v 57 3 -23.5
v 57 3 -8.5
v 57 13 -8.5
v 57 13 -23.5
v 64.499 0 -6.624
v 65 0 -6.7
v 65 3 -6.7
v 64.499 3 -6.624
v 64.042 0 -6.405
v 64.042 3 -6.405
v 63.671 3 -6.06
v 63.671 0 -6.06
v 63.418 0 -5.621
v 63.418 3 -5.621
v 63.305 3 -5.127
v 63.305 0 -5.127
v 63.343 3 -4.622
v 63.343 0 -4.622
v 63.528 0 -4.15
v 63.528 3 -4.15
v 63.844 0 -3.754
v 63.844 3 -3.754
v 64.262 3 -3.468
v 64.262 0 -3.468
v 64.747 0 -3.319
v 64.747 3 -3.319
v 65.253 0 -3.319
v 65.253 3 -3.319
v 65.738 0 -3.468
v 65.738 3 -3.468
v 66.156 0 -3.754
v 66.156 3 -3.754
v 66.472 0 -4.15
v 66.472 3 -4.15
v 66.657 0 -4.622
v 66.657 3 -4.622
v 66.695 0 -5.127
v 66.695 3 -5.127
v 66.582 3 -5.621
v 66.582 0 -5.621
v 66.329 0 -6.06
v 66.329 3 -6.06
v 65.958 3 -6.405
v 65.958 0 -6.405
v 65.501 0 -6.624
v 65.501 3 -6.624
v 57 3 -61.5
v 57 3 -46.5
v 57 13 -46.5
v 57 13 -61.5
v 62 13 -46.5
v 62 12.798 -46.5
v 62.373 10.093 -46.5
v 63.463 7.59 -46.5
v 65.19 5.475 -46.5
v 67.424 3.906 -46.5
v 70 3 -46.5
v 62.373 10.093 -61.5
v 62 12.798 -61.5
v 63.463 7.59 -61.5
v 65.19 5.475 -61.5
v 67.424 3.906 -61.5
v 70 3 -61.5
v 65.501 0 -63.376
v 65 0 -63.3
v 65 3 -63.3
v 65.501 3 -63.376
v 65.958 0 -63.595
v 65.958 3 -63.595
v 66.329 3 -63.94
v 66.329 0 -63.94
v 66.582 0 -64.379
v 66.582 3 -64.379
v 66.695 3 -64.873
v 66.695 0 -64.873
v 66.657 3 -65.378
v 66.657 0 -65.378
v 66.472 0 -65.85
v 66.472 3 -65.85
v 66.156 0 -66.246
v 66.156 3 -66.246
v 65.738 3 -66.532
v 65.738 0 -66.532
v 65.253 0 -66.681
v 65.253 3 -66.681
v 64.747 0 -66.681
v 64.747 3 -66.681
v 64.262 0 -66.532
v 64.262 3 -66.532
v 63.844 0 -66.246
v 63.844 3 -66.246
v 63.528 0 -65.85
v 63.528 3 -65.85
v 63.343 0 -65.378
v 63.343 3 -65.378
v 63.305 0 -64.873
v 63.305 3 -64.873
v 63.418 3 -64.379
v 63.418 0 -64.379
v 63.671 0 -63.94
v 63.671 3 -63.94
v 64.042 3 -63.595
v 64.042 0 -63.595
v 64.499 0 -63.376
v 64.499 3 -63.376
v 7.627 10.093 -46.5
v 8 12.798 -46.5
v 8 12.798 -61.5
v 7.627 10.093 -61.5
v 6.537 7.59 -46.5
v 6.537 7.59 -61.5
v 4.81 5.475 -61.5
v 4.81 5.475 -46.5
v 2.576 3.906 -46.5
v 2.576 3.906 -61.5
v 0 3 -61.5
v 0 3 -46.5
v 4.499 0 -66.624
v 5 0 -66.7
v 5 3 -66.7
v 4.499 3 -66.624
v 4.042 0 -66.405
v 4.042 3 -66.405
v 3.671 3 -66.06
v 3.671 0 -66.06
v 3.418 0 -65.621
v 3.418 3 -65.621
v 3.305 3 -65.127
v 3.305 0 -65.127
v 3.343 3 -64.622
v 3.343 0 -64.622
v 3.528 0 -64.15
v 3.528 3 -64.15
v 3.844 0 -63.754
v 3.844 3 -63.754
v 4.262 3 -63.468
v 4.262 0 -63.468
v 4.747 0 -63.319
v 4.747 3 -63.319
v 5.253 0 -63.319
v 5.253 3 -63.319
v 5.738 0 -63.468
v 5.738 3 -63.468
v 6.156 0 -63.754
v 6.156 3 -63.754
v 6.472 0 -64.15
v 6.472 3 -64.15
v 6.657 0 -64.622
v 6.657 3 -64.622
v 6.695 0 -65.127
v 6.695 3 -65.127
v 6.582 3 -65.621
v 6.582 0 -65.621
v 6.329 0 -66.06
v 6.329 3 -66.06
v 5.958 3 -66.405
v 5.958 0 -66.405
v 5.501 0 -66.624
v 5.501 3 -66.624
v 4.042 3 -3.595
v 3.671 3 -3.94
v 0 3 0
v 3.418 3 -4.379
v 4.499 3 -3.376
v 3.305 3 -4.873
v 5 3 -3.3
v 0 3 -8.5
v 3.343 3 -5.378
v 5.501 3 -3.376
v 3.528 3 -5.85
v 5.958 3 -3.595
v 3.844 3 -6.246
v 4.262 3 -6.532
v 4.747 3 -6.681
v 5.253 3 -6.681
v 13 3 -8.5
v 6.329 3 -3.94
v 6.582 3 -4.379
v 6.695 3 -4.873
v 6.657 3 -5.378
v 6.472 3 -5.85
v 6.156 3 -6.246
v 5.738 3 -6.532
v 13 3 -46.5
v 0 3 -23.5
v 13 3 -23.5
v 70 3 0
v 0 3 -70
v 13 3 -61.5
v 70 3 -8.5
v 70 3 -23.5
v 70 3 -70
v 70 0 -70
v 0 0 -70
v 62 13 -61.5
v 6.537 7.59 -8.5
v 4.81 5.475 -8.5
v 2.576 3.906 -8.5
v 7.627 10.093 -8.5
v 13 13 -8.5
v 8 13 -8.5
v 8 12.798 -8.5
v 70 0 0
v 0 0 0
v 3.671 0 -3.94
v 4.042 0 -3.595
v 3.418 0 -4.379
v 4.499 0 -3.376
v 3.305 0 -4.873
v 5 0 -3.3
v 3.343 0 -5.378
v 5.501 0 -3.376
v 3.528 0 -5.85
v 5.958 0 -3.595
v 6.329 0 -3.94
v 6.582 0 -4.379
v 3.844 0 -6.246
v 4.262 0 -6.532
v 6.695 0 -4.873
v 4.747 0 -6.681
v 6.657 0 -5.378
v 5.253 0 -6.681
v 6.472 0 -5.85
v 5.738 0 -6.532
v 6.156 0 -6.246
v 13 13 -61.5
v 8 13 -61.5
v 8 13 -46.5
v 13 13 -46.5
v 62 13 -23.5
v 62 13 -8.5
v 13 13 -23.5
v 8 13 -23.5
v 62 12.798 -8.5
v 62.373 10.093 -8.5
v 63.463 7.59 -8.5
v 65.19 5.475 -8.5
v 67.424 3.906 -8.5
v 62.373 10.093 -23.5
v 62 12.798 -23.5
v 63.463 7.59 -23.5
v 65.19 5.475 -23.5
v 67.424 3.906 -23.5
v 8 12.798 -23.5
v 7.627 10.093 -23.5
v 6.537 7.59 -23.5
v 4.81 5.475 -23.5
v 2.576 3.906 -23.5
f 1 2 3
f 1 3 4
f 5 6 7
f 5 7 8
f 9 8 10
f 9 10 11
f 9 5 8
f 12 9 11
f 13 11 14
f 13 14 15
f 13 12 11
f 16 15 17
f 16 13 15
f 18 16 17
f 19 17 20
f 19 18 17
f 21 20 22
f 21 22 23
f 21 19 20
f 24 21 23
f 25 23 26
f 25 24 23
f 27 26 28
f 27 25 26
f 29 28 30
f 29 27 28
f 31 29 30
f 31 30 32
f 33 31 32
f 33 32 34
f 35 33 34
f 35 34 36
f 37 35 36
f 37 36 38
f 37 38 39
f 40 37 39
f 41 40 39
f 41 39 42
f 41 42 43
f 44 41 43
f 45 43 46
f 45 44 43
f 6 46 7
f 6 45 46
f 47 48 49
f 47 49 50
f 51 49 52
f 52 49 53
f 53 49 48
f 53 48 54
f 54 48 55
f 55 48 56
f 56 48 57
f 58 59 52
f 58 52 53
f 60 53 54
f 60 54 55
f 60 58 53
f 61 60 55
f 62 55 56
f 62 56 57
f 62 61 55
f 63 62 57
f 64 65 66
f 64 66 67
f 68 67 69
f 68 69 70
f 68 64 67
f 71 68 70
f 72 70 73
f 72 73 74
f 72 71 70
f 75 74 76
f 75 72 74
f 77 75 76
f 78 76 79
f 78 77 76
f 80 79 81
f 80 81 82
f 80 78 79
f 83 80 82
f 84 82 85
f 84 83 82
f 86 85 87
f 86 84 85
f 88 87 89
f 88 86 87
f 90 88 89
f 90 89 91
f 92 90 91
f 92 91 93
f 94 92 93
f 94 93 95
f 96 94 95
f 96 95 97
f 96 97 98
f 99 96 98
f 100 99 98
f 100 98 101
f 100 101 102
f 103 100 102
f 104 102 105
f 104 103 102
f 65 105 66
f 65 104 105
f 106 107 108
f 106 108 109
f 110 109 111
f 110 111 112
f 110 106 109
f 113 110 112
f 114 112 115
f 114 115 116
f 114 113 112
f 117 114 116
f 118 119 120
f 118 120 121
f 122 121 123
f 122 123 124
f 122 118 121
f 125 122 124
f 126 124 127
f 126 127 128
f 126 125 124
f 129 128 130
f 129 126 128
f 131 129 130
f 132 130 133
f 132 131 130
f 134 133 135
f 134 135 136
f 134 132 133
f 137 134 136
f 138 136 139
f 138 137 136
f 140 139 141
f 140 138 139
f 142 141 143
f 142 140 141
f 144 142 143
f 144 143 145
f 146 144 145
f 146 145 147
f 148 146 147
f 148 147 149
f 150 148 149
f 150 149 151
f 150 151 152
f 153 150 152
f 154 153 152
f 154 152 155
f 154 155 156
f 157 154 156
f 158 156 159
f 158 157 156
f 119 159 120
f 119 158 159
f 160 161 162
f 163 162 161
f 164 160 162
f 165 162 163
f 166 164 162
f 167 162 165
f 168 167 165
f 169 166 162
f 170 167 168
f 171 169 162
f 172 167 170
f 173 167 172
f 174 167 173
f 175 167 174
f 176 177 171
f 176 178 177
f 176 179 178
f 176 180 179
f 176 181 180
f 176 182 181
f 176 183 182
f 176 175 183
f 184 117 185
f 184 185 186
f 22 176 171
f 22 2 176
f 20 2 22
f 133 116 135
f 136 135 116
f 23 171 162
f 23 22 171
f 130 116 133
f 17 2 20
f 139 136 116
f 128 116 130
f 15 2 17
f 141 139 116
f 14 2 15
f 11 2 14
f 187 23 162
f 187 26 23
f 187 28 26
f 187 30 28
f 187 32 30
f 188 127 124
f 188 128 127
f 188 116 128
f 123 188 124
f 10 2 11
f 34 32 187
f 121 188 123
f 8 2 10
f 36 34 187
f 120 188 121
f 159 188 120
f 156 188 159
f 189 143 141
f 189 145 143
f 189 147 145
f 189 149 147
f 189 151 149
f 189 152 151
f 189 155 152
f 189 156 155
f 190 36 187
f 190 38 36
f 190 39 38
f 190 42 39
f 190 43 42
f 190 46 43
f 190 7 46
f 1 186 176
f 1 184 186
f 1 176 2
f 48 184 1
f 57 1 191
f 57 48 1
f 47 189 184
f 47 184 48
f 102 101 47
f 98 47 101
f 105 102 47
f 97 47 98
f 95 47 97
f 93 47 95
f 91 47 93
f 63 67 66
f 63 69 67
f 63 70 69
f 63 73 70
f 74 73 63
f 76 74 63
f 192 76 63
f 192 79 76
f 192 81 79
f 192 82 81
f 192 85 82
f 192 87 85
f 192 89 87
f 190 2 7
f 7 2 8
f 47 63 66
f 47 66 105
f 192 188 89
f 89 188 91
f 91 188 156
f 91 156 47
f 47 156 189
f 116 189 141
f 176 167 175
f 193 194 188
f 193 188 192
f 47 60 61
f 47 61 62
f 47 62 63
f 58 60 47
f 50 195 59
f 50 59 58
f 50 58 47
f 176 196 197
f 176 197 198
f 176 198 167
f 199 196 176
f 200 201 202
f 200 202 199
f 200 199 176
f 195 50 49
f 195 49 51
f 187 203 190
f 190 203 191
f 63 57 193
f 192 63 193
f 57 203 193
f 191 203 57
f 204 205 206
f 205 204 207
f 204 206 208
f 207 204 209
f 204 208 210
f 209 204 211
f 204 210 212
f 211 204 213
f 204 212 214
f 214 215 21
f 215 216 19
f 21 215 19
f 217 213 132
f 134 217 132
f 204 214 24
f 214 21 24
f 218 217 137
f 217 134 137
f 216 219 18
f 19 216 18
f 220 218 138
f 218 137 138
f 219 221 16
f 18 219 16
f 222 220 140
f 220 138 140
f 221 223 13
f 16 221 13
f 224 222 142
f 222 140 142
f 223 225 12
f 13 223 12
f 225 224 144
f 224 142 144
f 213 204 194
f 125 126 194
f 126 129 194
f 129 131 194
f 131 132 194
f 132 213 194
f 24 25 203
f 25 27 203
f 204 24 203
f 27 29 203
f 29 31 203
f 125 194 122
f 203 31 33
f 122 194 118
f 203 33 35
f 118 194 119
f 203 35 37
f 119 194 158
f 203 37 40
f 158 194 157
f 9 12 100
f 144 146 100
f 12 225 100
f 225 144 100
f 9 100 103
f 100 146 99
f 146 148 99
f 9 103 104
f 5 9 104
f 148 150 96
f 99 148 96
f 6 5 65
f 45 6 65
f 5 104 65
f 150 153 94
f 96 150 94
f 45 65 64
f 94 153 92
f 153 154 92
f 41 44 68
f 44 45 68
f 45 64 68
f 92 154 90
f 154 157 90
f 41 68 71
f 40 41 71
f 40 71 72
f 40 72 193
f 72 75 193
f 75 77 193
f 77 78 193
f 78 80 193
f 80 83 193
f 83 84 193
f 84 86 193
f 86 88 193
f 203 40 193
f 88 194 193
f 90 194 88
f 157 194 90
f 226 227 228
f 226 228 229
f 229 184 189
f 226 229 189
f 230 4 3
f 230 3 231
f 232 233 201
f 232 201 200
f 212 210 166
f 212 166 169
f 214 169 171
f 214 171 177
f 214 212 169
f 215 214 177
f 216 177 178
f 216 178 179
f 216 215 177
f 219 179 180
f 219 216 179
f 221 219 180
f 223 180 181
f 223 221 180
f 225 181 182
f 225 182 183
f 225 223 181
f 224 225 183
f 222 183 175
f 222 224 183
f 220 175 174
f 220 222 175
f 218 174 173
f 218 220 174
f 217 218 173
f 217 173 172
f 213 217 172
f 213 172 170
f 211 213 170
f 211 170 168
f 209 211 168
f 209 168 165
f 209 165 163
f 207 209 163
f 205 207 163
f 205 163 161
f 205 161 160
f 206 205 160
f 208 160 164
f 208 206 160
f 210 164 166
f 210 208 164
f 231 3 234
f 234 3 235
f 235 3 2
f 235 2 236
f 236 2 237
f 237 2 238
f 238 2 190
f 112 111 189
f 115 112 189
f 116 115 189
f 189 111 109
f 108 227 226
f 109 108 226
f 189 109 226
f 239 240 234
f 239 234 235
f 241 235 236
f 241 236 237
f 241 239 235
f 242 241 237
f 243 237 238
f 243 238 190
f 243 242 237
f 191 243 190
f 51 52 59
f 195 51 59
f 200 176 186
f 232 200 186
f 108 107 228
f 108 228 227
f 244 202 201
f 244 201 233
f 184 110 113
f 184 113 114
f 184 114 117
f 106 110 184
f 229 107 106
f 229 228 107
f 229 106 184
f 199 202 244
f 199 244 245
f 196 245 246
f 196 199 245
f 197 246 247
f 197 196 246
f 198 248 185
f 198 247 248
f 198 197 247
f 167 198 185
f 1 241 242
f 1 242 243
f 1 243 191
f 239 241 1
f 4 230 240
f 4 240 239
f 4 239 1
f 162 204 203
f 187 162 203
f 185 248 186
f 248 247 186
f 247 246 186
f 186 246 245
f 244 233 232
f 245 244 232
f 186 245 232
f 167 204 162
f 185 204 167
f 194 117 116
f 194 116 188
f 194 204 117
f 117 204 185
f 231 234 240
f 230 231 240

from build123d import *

# Parameters (mm, degrees)
SKETCH1_W           = 70
SKETCH1_H           = 70
SKETCH1_R           = 1.7
PLATE_DEPTH         = 3
SKETCH2_W           = 5
SKETCH2_H           = 15
BOSS_EXTRUDE1_DEPTH = 10
FILLET1_R           = 10


with BuildPart() as part:
    # Sketch1 → Plate (new body)
    with BuildSketch(Plane(origin=(0, 0, 0), x_dir=(1, 0, 0), z_dir=(0, 1, 0))):
        with Locations((35, 35)):
            Rectangle(SKETCH1_W, SKETCH1_H)
        with Locations(Location((65, 65, 0), (0, 0, 270))):
            Circle(SKETCH1_R, mode=Mode.SUBTRACT)
        with Locations(Location((5, 65, 0), (0, 0, 90))):
            Circle(SKETCH1_R, mode=Mode.SUBTRACT)
        with Locations(Location((65, 5, 0), (0, 0, 90))):
            Circle(SKETCH1_R, mode=Mode.SUBTRACT)
        with Locations(Location((5, 5, 0), (0, 0, 270))):
            Circle(SKETCH1_R, mode=Mode.SUBTRACT)
    extrude(amount=PLATE_DEPTH)

    # Sketch2 → Boss-Extrude1 (add)
    with BuildSketch(Plane(origin=(0, 3, 0), x_dir=(1, 0, 0), z_dir=(0, 1, 0))):
        with Locations((10.5, 54)):
            Rectangle(SKETCH2_W, SKETCH2_H)
        with Locations((59.5, 54)):
            Rectangle(SKETCH2_W, SKETCH2_H)
        with Locations((10.5, 16)):
            Rectangle(SKETCH2_W, SKETCH2_H)
        with Locations((59.5, 16)):
            Rectangle(SKETCH2_W, SKETCH2_H)
    extrude(amount=BOSS_EXTRUDE1_DEPTH)

    # Fillet1
    # the kernel refuses this fillet: 10 mm, written as the material it adds along each edge
    with BuildSketch(Plane(origin=(8, 3, -22.005102572), x_dir=(-1, 0, 0), z_dir=(0, 0, -1))) as fillet1_piece_1_section:
        with BuildLine():
            CenterArc((10, 9.797958971), FILLET1_R, 180, 78.463040967)
            Line((0, 9.797958971), (-0.2, 9.797958971))
            Line((-0.2, 9.797958971), (-0.2, 0))
            Line((-0.2, 0), (0, -0.2))
            ThreePointArc((0, -0.2), (4, -0.2), (7.96, -0.195959179))
            Line((7.96, -0.195959179), (8, 0))
        make_face()
    fillet1_piece_1 = extrude(amount=39.494897428, mode=Mode.PRIVATE)
    fillet1_piece_1 = split(fillet1_piece_1, bisect_by=Plane(origin=(6.00439902, 5.286170926, -23.5), z_dir=(0, 0, 1)), keep=Keep.TOP, mode=Mode.PRIVATE)
    add(fillet1_piece_1)
    with BuildSketch(Plane(origin=(8, 3, -46.5), x_dir=(-1, 0, 0), z_dir=(0, 0, -1)), Plane(origin=(62, 3, -61.5), x_dir=(1, 0, 0), z_dir=(0, 0, 1)), Plane(origin=(8, 3, -8.5), x_dir=(-1, 0, 0), z_dir=(0, 0, -1)), Plane(origin=(62, 3, -23.5), x_dir=(1, 0, 0), z_dir=(0, 0, 1))) as fillet1_piece_2:
        with BuildLine():
            CenterArc((10, 9.797958971), FILLET1_R, 180, 78.463040967)
            Line((0, 9.797958971), (-0.2, 9.797958971))
            Line((-0.2, 9.797958971), (-0.2, 0))
            Line((-0.2, 0), (0, -0.2))
            ThreePointArc((0, -0.2), (4, -0.2), (7.96, -0.195959179))
            Line((7.96, -0.195959179), (8, 0))
        make_face()
    extrude(amount=15)
    with BuildSketch(Plane(origin=(62, 3, -61.5), x_dir=(1, 0, 0), z_dir=(0, 0, 1))) as fillet1_piece_3_section:
        with BuildLine():
            CenterArc((10, 9.797958971), FILLET1_R, 180, 78.463040967)
            Line((0, 9.797958971), (-0.2, 9.797958971))
            Line((-0.2, 9.797958971), (-0.2, 0))
            Line((-0.2, 0), (0, -0.2))
            ThreePointArc((0, -0.2), (4, -0.2), (7.96, -0.195959179))
            Line((7.96, -0.195959179), (8, 0))
        make_face()
    fillet1_piece_3 = extrude(amount=39.494897428, mode=Mode.PRIVATE)
    fillet1_piece_3 = split(fillet1_piece_3, bisect_by=Plane(origin=(63.99560098, 5.286170926, -23.5), z_dir=(0, 0, 1)), keep=Keep.TOP, mode=Mode.PRIVATE)
    add(fillet1_piece_3)
    with BuildSketch(Plane(origin=(8, 3, -8.5), x_dir=(-1, 0, 0), z_dir=(0, 0, -1))) as fillet1_piece_4_section:
        with BuildLine():
            CenterArc((10, 9.797958971), FILLET1_R, 180, 78.463040967)
            Line((0, 9.797958971), (-0.2, 9.797958971))
            Line((-0.2, 9.797958971), (-0.2, 0))
            Line((-0.2, 0), (0, -0.2))
            ThreePointArc((0, -0.2), (4, -0.2), (7.96, -0.195959179))
            Line((7.96, -0.195959179), (8, 0))
        make_face()
    fillet1_piece_4 = extrude(amount=39.494897428, mode=Mode.PRIVATE)
    fillet1_piece_4 = split(fillet1_piece_4, bisect_by=Plane(origin=(6.00439902, 5.286170926, -46.5), z_dir=(0, 0, -1)), keep=Keep.TOP, mode=Mode.PRIVATE)
    add(fillet1_piece_4)
    with BuildSketch(Plane(origin=(62, 3, -47.994897428), x_dir=(1, 0, 0), z_dir=(0, 0, 1))) as fillet1_piece_5_section:
        with BuildLine():
            CenterArc((10, 9.797958971), FILLET1_R, 180, 78.463040967)
            Line((0, 9.797958971), (-0.2, 9.797958971))
            Line((-0.2, 9.797958971), (-0.2, 0))
            Line((-0.2, 0), (0, -0.2))
            ThreePointArc((0, -0.2), (4, -0.2), (7.96, -0.195959179))
            Line((7.96, -0.195959179), (8, 0))
        make_face()
    fillet1_piece_5 = extrude(amount=39.494897428, mode=Mode.PRIVATE)
    fillet1_piece_5 = split(fillet1_piece_5, bisect_by=Plane(origin=(63.99560098, 5.286170926, -46.5), z_dir=(0, 0, -1)), keep=Keep.TOP, mode=Mode.PRIVATE)
    add(fillet1_piece_5)


solid = part.part
